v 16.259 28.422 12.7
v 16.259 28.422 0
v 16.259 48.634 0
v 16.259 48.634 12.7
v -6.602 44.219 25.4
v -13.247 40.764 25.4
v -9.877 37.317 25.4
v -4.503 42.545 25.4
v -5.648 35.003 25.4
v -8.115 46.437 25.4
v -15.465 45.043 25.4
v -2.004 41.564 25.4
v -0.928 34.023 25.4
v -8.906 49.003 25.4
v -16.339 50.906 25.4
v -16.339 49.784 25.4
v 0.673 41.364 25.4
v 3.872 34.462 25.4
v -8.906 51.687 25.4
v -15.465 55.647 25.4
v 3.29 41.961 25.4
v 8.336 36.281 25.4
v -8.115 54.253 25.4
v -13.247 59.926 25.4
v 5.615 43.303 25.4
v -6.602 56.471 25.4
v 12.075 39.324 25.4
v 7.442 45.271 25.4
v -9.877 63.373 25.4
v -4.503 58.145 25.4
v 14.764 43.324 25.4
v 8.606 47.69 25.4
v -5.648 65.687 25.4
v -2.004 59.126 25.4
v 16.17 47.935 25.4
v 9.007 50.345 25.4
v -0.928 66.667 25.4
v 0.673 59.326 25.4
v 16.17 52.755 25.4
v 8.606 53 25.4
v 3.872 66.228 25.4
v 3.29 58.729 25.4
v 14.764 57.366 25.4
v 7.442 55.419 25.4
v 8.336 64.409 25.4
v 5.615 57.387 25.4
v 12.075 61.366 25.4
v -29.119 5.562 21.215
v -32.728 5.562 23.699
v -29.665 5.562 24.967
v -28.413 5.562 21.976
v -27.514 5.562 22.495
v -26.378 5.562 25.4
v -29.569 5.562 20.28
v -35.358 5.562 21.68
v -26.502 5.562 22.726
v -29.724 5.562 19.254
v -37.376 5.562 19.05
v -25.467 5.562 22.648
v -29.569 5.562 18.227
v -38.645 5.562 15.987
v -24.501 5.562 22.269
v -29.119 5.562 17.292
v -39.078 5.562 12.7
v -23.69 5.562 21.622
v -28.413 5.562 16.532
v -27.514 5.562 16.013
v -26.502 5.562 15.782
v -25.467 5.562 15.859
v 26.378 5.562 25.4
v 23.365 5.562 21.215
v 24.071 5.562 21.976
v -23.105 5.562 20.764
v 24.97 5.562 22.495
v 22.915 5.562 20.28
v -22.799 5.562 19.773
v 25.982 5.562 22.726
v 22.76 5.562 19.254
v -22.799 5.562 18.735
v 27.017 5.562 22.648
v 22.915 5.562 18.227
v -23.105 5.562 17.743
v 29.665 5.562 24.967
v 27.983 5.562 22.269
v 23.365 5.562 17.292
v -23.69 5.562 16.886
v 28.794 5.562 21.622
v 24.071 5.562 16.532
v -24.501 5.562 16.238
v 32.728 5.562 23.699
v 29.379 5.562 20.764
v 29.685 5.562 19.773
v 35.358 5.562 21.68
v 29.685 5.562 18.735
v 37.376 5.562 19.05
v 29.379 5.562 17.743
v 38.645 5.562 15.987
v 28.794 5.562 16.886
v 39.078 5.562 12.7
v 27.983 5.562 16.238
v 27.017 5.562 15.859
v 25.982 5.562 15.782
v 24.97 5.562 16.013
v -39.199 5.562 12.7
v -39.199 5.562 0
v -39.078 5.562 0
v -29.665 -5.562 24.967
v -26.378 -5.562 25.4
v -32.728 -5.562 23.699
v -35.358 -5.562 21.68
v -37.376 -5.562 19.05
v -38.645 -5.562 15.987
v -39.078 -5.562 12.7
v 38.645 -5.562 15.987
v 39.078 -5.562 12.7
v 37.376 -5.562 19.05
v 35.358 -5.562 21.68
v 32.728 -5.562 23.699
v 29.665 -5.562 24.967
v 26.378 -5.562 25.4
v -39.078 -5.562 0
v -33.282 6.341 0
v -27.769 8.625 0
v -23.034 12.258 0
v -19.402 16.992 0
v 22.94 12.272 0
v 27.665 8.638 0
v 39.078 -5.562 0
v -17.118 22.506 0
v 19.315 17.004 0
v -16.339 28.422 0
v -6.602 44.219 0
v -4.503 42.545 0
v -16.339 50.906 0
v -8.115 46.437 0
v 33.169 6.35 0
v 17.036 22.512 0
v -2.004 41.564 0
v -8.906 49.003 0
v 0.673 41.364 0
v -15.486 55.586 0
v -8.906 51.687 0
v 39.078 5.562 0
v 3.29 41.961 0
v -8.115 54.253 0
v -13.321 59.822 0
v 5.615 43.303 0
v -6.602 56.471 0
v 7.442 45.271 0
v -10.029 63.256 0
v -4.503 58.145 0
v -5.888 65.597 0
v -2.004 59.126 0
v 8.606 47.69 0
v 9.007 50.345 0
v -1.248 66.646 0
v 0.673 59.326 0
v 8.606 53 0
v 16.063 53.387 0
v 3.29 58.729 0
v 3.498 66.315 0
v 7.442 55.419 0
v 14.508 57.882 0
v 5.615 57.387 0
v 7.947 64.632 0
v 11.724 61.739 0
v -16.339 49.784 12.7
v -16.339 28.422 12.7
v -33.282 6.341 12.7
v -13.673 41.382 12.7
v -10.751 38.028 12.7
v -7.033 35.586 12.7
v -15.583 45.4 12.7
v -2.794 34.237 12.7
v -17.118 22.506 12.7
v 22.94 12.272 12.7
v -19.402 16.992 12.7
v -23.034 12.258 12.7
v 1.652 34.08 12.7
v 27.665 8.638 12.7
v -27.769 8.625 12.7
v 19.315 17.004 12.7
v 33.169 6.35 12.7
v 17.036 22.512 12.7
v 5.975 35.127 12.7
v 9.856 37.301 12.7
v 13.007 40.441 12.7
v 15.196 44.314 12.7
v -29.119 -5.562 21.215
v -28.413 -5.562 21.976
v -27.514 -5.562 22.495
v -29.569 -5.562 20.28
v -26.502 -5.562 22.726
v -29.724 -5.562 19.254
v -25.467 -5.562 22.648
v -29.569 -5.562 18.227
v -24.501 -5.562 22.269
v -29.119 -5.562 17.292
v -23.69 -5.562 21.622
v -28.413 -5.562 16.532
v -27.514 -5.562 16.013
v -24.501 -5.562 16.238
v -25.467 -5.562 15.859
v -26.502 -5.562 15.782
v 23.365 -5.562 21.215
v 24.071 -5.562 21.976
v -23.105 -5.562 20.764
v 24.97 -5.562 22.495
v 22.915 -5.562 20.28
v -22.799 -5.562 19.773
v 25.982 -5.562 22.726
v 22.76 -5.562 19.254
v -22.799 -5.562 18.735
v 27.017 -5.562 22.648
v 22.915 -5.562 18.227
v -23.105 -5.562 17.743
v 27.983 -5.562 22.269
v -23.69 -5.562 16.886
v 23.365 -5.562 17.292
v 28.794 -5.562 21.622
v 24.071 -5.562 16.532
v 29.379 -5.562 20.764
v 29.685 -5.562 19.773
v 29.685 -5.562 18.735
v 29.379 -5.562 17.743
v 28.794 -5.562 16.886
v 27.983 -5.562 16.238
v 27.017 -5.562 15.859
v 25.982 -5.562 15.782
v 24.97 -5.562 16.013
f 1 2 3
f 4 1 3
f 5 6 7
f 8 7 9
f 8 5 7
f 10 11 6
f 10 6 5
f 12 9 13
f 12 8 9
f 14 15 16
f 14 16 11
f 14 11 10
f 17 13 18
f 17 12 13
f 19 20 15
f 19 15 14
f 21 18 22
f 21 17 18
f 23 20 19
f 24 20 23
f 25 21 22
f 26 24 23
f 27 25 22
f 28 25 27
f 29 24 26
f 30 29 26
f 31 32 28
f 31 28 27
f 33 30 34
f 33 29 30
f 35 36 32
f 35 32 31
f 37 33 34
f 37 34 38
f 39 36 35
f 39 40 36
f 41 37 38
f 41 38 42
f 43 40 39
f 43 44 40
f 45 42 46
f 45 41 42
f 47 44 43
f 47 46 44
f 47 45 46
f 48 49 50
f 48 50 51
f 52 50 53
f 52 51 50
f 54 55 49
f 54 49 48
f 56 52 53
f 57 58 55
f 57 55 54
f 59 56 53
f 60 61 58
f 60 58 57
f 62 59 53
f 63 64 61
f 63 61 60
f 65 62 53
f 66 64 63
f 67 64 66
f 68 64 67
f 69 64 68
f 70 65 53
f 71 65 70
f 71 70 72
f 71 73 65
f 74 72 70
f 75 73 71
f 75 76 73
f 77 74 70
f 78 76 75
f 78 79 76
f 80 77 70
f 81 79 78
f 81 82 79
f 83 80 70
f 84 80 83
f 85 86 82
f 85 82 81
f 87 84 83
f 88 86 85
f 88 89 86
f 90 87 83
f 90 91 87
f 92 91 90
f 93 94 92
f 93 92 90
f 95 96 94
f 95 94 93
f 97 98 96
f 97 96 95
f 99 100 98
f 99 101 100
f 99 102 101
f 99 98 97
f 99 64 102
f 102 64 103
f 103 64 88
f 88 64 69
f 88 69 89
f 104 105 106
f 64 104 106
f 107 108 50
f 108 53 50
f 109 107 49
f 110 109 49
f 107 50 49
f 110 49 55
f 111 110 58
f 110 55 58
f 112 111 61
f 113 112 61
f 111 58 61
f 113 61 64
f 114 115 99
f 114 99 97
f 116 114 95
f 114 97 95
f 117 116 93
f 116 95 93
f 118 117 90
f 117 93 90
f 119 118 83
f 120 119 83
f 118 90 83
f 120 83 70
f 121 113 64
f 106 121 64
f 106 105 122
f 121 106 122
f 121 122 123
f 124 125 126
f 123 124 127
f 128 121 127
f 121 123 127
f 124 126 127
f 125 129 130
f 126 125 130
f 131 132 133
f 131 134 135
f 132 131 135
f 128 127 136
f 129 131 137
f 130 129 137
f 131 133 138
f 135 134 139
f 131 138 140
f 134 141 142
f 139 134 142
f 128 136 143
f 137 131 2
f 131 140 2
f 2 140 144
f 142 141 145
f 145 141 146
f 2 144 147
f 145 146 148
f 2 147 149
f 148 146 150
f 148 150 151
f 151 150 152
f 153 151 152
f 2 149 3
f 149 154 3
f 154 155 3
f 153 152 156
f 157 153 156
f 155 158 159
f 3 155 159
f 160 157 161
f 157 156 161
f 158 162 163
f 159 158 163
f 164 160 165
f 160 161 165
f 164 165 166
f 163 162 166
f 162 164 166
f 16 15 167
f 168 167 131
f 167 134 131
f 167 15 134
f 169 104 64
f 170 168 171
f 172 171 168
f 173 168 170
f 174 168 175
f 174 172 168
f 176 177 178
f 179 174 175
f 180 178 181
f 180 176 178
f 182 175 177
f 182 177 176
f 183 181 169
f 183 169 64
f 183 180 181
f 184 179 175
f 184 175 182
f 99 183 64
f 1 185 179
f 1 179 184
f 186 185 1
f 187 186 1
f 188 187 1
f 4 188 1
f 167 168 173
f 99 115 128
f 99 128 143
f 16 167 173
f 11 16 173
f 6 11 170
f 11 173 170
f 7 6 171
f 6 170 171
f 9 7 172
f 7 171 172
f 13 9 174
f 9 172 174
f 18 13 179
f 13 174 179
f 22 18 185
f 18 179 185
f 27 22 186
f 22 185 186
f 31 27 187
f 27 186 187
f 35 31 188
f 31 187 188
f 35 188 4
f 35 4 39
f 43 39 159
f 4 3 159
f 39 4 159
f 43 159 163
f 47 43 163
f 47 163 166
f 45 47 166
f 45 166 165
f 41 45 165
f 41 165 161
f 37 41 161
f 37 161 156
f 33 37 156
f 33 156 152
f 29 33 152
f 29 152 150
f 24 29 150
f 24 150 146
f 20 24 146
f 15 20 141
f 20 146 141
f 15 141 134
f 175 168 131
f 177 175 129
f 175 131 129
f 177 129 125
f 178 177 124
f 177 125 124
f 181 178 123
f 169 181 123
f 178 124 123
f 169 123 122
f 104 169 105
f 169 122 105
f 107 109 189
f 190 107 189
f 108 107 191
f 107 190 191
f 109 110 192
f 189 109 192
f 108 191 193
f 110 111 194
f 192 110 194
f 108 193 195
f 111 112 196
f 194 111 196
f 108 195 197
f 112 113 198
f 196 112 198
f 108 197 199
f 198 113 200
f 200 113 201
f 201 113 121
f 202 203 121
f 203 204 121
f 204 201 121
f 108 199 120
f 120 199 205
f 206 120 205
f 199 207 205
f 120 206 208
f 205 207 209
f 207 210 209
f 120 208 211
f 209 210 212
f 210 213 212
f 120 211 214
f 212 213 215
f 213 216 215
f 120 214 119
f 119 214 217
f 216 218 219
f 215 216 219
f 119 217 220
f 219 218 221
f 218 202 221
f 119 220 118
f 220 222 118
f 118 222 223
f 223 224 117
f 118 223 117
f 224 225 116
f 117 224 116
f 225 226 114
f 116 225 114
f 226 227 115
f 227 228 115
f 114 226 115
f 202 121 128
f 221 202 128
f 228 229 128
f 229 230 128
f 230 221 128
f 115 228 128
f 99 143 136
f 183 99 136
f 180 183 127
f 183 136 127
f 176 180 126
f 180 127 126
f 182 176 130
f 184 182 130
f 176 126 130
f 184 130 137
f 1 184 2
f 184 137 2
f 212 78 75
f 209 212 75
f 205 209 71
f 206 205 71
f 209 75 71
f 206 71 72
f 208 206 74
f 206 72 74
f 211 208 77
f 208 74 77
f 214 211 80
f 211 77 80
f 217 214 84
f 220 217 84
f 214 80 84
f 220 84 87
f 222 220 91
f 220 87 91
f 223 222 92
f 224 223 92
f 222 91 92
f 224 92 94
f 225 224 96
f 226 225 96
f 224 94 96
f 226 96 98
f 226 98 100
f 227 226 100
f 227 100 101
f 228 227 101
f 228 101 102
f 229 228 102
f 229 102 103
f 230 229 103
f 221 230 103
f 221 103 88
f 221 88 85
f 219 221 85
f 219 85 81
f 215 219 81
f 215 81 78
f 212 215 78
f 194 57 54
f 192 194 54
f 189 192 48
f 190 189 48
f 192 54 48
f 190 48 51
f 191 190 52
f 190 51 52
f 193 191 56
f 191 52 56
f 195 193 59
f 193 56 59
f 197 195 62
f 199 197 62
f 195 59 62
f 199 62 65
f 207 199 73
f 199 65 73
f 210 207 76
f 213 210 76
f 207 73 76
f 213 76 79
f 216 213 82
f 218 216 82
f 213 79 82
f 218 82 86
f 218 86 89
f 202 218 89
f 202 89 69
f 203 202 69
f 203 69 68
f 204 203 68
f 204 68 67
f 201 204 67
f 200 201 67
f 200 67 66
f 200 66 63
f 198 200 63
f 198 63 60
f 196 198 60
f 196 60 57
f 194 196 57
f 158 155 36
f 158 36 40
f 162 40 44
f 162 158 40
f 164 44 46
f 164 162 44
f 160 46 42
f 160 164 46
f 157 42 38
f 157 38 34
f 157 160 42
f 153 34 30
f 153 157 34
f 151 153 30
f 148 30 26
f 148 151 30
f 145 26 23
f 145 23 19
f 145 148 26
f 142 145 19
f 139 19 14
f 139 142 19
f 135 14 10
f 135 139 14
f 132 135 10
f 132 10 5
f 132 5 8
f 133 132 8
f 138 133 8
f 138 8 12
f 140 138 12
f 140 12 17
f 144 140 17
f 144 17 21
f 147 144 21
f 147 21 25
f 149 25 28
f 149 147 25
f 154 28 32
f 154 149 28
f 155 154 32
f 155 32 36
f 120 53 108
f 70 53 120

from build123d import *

# Parameters (mm, degrees)
F0_W     = 78.1559348106
F0_H     = 11.1243845895
F1_DEPTH = 25.4
F0_R     = 9.006561322
F2_DEPTH = 12.7
F3_R     = 12.7
F4_R     = 3.4818048238
F5_DEPTH = 11.1253845895


# Not quite as in the source:
# - ends of sketch curves that miss each other by under 0.0002 mm in the source are joined


with BuildPart() as f1:
    # F0 (on Top) → F1 (new body)
    with BuildSketch(Plane.XY):
        Rectangle(F0_W, F0_H)
    extrude(amount=F1_DEPTH)



with BuildPart() as f1b:
    # F0 (on Top) → F1, piece 2 (new body)
    with BuildSketch(Plane.XY):
        with BuildLine():
            Line((-16.3389042508, 50.9063668795), (-16.3389042508, 49.7835881762))
            ThreePointArc((-16.3389042508, 49.7835881762), (-0.5764210141, 34.0065966737), (16.2587184459, 48.6335381866))
            ThreePointArc((16.2587184459, 48.6335381866), (1.1371213689, 66.6539292144), (-16.3389042508, 50.9063668795))
        make_face()
        with Locations((0, 50.3449775279)):
            Circle(F0_R, mode=Mode.SUBTRACT)
    extrude(amount=F1_DEPTH)


with BuildPart() as f1_1:
    add(f1.part)

    add(f1b.part)  # F2 merges F1b
    # F0 (on Top) → F2 (join)
    with BuildSketch(Plane.XY):
        with BuildLine():
            ThreePointArc((-16.3389042508, 28.4221922947), (-23.0344432329, 12.2577312768), (-39.1989042508, 5.5621922947))
            Line((-39.1989042508, 5.5621922947), (-39.0779674053, 5.5621922947))
            Line((-39.0779674053, 5.5621922947), (39.0779674053, 5.5621922947))
            ThreePointArc((39.0779674053, 5.5621922947), (22.9398561975, 12.2721453491), (16.2587184459, 28.4221922947))
            Line((16.2587184459, 28.4221922947), (16.2587184459, 48.6335381866))
            ThreePointArc((16.2587184459, 48.6335381866), (-0.5764210141, 34.0065966737), (-16.3389042508, 49.7835881762))
            Line((-16.3389042508, 49.7835881762), (-16.3389042508, 28.4221922947))
        make_face()
    extrude(amount=F2_DEPTH)

    # F3
    f3_edges = [f1_1.edges().sort_by_distance(p)[0] for p in [
        (39.077967, 0, 25.4),
        (-39.077967, 0, 25.4),
    ]]
    fillet(f3_edges, radius=F3_R)

    # F4 (on face) → F5 (cut, through all)
    with BuildSketch(Plane(origin=(0, 5.5621922947, 0), x_dir=(-1, 0, 0), z_dir=(0, 1, 0))):
        with Locations((-26.2421388179, 19.2537438124)):
            Circle(F4_R)
        with Locations((26.2421388179, 19.2537438124)):
            Circle(F4_R)
    extrude(amount=-F5_DEPTH, mode=Mode.SUBTRACT)


solid = f1_1.part
